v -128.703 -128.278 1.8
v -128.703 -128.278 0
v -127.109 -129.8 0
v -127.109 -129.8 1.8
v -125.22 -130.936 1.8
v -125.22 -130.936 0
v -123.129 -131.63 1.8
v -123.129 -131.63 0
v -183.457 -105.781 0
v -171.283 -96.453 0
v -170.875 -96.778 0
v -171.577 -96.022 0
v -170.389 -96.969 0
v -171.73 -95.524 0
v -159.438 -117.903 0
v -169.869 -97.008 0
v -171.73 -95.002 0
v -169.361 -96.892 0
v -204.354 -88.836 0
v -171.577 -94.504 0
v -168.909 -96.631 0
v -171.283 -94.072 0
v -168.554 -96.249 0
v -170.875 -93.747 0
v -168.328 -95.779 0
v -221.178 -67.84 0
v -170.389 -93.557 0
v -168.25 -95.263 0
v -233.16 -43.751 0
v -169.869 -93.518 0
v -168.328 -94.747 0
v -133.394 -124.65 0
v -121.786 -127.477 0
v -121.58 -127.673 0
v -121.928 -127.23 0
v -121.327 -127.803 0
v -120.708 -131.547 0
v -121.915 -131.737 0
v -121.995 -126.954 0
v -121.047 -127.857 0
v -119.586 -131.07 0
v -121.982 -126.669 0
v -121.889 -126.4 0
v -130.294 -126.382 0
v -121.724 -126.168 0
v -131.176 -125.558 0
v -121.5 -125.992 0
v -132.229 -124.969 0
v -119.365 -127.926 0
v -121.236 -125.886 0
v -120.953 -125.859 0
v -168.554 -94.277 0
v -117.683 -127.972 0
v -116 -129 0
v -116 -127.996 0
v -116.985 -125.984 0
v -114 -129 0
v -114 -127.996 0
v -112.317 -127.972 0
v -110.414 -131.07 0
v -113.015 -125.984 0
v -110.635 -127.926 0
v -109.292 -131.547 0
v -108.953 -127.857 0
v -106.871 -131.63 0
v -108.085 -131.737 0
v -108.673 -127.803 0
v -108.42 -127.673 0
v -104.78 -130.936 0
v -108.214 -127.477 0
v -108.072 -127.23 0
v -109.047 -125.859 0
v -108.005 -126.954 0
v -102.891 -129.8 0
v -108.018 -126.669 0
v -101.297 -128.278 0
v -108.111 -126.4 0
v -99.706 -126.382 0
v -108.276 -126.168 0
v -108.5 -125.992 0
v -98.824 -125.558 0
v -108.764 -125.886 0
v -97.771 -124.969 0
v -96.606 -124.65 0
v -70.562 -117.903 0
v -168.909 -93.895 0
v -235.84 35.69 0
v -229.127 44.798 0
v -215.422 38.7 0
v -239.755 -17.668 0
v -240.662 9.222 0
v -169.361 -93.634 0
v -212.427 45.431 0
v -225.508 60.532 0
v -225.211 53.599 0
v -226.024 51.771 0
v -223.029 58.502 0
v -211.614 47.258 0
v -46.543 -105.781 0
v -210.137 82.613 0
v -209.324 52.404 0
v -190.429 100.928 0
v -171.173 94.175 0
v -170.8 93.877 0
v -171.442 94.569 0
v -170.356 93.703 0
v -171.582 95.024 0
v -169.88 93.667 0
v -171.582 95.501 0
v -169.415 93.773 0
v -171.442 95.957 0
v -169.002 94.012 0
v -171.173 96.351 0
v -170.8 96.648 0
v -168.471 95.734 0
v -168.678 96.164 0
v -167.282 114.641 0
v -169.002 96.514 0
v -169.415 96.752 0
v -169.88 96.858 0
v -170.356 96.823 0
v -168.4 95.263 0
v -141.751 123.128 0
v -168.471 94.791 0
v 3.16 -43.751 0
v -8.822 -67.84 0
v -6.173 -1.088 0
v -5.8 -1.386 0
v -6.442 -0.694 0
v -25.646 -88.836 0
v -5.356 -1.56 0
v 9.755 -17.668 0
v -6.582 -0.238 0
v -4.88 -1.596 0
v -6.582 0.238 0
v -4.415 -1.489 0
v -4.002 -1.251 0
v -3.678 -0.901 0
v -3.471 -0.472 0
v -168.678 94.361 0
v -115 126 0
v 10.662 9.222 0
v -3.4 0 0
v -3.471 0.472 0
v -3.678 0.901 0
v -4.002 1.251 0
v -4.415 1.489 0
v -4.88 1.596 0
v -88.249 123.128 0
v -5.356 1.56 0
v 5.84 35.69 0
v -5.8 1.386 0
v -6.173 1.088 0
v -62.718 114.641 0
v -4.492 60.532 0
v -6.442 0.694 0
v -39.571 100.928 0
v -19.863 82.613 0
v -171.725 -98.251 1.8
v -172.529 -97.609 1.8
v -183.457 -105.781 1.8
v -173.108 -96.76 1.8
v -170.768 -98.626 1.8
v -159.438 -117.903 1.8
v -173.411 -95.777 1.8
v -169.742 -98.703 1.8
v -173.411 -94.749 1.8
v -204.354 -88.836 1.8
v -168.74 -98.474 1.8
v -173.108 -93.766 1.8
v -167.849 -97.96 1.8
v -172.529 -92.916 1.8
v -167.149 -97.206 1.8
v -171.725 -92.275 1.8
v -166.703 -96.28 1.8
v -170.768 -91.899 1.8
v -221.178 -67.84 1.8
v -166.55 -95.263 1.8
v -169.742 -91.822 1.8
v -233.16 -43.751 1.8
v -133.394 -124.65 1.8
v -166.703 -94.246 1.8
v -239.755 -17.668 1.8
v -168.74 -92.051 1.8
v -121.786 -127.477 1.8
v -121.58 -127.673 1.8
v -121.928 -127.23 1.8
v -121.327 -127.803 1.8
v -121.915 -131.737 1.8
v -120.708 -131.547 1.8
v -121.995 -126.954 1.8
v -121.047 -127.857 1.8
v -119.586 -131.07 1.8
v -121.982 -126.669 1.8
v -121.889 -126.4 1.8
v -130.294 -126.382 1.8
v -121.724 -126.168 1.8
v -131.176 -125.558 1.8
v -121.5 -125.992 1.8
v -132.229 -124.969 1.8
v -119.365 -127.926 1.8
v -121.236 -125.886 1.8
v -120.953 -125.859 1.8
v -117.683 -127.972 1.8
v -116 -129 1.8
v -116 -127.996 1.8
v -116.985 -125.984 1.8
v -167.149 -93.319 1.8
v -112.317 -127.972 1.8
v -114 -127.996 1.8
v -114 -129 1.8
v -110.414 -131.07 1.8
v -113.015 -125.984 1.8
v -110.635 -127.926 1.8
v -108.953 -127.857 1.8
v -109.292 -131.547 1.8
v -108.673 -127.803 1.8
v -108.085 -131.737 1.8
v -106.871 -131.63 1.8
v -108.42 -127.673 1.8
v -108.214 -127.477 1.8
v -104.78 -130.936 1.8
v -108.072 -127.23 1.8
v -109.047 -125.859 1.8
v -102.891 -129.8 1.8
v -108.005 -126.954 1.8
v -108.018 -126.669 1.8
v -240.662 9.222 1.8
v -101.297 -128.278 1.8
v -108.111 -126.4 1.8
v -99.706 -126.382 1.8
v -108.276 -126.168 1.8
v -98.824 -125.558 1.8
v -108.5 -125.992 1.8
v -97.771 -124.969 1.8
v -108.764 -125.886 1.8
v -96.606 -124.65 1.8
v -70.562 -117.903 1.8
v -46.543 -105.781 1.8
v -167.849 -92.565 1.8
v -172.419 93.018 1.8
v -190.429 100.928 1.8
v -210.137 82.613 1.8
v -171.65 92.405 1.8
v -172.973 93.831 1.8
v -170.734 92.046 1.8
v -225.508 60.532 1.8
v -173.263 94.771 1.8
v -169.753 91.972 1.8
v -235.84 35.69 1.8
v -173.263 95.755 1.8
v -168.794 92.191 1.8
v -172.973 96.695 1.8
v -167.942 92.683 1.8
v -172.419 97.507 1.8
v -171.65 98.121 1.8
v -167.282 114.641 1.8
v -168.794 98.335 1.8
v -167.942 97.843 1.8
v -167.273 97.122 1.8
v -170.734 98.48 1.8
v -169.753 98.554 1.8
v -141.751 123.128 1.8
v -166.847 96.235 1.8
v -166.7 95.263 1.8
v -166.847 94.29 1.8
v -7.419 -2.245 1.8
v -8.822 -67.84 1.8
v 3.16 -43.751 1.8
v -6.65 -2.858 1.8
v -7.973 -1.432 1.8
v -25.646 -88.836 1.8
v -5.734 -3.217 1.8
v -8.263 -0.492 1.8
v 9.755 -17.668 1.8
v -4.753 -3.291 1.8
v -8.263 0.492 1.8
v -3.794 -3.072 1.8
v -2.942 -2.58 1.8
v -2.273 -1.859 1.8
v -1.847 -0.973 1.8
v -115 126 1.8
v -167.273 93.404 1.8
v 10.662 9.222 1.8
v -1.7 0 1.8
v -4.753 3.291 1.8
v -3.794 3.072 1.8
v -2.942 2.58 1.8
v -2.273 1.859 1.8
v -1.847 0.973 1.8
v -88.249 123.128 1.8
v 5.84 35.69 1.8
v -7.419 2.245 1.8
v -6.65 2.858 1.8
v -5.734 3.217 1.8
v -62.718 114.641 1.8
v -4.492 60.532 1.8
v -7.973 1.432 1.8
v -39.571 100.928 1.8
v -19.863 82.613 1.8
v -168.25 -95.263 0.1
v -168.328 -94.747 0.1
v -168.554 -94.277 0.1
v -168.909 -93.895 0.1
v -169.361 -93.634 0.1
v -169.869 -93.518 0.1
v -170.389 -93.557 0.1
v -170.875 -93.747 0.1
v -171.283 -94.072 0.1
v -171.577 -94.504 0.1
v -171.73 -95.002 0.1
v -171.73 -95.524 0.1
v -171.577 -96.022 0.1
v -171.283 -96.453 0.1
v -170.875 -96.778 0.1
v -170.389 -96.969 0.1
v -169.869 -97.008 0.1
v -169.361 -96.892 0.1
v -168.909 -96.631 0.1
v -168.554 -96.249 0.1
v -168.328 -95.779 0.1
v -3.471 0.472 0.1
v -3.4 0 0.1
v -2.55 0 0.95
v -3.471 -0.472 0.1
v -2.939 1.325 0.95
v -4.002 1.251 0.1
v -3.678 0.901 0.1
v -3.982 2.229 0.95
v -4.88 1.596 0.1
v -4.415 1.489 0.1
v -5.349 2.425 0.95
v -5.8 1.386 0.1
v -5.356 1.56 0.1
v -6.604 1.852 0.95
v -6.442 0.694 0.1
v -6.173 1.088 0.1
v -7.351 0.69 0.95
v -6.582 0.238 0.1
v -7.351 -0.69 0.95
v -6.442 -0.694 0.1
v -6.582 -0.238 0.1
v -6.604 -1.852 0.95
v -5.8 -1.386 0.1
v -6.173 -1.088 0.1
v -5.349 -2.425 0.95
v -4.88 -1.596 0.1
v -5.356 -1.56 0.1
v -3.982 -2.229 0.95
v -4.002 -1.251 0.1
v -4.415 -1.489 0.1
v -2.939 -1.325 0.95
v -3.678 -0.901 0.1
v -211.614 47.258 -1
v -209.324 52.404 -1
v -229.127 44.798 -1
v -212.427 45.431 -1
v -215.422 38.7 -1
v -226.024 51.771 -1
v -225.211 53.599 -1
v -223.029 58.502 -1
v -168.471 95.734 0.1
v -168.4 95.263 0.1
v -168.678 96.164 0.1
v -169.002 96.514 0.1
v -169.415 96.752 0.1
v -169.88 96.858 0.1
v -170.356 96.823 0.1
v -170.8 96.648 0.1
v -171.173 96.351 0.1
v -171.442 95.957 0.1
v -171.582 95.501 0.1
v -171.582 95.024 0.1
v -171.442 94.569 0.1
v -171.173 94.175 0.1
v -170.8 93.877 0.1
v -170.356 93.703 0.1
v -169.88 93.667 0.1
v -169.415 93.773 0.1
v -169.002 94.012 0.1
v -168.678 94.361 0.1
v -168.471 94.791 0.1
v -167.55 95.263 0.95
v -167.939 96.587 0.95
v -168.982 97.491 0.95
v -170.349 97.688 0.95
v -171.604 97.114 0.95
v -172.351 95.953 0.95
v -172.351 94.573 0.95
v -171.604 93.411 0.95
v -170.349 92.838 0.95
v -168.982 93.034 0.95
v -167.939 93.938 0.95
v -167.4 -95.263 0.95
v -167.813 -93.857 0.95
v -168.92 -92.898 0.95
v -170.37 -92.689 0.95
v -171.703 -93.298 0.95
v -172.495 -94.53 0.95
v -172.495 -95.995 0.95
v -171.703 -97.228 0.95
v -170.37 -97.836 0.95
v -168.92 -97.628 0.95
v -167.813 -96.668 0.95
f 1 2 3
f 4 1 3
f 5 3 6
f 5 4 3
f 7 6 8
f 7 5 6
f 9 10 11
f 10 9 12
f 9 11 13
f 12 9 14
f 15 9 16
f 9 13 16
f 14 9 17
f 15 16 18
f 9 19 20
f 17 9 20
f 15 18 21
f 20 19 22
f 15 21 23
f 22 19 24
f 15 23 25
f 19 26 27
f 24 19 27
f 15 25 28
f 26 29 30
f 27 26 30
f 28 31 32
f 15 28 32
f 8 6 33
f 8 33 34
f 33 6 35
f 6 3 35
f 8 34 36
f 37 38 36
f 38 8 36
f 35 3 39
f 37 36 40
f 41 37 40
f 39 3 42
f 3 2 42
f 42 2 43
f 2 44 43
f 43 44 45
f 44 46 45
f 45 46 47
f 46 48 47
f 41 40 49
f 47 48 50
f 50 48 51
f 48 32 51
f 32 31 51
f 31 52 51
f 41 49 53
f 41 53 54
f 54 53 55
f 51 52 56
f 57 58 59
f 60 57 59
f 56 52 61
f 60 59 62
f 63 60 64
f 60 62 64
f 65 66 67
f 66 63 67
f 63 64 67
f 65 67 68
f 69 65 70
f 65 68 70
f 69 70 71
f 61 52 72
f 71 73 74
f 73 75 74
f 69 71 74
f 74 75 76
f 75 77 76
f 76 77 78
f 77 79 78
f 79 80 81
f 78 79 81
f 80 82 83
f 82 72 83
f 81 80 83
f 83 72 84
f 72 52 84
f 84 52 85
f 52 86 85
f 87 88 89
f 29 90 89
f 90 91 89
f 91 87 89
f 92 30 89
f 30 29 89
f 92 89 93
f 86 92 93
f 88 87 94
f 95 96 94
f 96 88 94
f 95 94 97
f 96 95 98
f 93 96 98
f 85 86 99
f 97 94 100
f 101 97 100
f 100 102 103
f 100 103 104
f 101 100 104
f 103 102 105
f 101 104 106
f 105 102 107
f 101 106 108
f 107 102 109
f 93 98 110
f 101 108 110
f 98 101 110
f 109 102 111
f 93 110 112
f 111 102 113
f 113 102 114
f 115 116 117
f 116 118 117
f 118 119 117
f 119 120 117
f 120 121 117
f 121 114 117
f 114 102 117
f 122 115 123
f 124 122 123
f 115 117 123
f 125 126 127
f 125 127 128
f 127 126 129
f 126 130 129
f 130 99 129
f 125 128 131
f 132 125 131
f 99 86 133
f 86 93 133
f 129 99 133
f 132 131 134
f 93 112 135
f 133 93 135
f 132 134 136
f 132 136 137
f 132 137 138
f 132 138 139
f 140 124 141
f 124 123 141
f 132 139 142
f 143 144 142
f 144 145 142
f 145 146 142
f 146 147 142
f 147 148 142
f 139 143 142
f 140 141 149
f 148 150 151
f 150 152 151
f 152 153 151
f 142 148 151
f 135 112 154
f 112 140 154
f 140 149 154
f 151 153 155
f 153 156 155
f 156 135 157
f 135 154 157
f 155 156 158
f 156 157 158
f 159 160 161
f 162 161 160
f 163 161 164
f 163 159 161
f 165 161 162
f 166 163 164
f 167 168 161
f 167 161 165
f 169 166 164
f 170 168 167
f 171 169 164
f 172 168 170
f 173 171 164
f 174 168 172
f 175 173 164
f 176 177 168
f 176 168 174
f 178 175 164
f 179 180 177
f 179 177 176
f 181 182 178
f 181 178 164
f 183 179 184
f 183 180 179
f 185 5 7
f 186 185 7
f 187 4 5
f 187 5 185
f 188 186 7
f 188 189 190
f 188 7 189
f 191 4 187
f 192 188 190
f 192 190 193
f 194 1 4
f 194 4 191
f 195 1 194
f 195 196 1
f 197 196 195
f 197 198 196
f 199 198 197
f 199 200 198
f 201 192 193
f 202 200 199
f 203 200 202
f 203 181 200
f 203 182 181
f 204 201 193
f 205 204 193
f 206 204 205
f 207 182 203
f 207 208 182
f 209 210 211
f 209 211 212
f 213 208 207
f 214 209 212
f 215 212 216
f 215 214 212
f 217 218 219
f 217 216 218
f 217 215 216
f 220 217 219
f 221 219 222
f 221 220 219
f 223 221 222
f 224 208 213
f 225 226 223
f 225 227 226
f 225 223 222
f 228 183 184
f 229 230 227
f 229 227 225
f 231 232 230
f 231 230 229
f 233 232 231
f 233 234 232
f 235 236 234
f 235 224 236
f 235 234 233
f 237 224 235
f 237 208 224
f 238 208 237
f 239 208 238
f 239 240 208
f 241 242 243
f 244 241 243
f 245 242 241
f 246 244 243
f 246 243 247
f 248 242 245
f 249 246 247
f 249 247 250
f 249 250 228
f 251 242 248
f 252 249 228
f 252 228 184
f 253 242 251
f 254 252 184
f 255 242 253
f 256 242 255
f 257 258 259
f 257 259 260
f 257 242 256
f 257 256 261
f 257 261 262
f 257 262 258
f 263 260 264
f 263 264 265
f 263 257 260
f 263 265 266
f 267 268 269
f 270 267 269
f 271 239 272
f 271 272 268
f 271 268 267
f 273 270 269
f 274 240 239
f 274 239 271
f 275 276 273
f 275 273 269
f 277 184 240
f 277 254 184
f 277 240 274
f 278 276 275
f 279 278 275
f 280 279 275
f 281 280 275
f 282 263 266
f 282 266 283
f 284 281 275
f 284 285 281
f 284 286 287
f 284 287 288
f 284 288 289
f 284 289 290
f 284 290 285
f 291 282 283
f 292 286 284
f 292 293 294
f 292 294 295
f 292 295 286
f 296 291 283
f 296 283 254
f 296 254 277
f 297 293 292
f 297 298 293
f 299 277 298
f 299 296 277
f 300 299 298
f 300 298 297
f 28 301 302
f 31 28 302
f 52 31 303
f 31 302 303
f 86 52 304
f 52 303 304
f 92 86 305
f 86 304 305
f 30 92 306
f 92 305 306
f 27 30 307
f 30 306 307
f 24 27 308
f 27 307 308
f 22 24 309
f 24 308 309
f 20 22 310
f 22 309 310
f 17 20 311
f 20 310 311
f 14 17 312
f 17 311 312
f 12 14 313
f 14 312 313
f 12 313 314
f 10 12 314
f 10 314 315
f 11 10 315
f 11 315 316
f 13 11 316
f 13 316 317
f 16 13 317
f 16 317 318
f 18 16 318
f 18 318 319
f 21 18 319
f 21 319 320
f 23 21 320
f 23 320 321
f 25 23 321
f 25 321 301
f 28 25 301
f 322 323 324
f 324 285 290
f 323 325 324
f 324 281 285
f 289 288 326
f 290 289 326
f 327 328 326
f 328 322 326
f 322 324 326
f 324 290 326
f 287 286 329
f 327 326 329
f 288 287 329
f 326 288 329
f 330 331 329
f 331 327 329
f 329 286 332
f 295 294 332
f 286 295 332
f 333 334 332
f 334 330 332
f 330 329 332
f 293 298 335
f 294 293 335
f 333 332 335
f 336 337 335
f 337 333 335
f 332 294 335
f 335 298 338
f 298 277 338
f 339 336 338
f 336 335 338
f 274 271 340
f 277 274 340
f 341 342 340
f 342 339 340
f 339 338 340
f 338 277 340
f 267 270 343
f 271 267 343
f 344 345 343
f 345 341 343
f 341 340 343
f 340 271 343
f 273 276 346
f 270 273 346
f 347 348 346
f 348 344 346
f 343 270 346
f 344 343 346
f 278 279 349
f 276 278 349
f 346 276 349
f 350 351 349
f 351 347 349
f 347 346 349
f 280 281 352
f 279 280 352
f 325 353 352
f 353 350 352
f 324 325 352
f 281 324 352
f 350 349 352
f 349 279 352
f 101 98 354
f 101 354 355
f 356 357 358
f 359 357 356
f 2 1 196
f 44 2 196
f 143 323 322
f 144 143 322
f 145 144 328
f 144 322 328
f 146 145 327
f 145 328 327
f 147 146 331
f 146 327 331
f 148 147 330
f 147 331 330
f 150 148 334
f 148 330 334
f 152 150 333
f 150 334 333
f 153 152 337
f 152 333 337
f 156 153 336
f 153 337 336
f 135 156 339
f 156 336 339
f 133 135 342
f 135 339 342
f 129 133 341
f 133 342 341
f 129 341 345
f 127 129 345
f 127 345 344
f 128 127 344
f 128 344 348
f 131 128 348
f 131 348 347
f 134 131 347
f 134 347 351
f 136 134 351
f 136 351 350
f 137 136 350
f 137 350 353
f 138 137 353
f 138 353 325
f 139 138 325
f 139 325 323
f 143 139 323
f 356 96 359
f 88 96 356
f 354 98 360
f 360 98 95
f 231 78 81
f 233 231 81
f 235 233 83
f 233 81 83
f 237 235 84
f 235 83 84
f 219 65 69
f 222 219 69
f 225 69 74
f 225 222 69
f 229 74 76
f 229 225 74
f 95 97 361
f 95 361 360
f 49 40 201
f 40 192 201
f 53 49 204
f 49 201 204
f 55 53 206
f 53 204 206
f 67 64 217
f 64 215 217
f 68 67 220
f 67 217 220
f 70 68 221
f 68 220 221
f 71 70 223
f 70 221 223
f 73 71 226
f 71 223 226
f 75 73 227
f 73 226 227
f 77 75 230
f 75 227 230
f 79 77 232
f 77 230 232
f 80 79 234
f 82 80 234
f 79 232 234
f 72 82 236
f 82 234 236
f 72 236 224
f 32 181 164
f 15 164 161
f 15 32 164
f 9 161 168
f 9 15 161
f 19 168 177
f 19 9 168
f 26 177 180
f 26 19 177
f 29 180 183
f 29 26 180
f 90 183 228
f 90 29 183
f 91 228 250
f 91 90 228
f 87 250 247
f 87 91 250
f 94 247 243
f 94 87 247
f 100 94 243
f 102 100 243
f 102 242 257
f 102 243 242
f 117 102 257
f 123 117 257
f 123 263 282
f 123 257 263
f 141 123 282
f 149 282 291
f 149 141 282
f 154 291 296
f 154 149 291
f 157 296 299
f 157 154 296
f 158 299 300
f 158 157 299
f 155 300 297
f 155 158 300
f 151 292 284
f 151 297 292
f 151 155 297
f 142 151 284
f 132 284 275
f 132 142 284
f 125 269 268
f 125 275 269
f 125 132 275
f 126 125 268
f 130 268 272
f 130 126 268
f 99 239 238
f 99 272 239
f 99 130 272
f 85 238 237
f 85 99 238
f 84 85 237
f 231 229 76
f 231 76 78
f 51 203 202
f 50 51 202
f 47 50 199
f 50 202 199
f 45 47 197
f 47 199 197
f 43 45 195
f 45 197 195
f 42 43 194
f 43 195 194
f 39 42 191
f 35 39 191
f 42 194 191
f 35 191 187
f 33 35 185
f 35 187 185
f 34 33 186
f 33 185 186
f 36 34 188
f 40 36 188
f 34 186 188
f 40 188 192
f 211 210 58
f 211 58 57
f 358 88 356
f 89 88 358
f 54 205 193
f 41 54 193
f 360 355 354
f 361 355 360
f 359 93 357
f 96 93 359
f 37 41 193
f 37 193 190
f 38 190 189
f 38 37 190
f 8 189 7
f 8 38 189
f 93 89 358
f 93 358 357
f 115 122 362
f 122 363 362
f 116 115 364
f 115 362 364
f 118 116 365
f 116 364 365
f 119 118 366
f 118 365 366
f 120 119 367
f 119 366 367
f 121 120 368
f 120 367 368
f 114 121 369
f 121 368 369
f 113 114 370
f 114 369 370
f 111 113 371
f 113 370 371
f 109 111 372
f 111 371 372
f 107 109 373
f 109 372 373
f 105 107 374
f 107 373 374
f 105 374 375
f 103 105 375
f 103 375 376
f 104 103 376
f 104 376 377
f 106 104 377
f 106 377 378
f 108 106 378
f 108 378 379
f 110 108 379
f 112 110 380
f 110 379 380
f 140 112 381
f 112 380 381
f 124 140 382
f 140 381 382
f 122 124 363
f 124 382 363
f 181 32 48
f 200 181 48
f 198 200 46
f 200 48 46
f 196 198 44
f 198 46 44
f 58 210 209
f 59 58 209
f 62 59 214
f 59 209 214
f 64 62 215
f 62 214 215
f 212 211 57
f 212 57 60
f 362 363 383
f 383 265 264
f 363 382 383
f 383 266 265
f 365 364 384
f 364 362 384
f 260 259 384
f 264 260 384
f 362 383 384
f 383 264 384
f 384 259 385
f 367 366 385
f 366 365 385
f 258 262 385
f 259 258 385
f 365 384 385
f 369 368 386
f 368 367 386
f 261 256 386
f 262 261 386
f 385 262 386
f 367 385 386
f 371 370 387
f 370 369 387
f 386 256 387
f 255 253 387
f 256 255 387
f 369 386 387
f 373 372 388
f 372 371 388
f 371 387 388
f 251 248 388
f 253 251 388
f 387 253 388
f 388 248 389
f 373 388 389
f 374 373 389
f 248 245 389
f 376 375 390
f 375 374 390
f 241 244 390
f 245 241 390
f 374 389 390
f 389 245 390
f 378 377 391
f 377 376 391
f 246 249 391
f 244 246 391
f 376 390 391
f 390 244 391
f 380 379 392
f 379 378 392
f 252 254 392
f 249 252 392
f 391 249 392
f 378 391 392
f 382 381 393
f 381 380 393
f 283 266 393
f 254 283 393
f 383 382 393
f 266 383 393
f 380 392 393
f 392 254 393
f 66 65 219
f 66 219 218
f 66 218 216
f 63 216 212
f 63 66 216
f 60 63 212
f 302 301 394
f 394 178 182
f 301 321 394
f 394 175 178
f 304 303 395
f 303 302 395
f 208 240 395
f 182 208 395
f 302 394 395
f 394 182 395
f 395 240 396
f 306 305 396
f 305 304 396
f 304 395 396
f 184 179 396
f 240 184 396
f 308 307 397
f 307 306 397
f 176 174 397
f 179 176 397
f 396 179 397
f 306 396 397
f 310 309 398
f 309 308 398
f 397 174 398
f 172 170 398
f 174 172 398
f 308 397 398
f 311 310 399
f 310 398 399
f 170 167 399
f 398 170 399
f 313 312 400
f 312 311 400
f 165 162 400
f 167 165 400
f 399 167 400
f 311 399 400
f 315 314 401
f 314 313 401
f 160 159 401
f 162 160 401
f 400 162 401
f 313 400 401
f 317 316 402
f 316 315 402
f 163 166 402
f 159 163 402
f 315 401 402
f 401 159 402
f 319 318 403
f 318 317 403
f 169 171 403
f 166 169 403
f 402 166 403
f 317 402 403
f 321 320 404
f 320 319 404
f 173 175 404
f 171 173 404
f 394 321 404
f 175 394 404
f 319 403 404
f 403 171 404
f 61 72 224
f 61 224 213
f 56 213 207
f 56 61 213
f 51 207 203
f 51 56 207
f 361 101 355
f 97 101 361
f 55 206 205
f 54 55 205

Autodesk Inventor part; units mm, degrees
ref_plane "YZ Plane" through (0, 0, 0) normal (1, 0, 0) x (0, 1, 0)
ref_plane "XZ Plane" through (0, 0, 0) normal (0, 1, 0) x (-1, 0, 0)
ref_plane "XY Plane" through (0, 0, 0) normal (0, 0, 1) x (1, 0, 0)
ref_plane "Work Plane1" through (0, 0, 0) normal (0, 0, 1) x (1, 0, 0)
sketch "Sketch1" plane through (0, 0, 0) normal (0, 0, 1) x (1, 0, 0)
  circle A0 centre (-115, 0) radius 5 projected
  circle A1 centre (-115, 0) radius 126
  point P0 (0, 0)
  dimension "d0" = 252
extrude "Extrusion1" add sketch "Sketch1" along normal blind 1.8 contours A0 | A1
sketch "Sketch2" plane through (-115, 0, 1.8) normal (0, 0, 1) x (1, 0, 0)
  circle A0 centre (-55, 95.2628) radius 1.6
  circle A1 centre (-55, -95.2628) radius 1.75
  circle A2 centre (110, 0) radius 1.6
  circle A3 centre (0, 0) radius 126 projected
  line L0 (-55, 95.2628) -> (110, 0)
  line L1 (110, 0) -> (-55, -95.2628)
  line L2 (-55, -95.2628) -> (-55, 95.2628)
  point P0 (115, 0)
  dimension "d3" = 3.2
  dimension "d4" = 3.5
  dimension "d5" = 3.2
  dimension "d11" = 110
extrude "Extrusion2" cut sketch "Sketch2" against normal blind 10 contours A0 L0 L2 | L2 L0 A0 | L2 L1 A1 | A1 L1 L2 | L0 L1 A2 | A2 L1 L0
chamfer "Chamfer1" distance 1.7 angle 45 3 edges at (-6.6, 0, 1.8) (-171.6, 95.2628, 1.8) (-171.75, -95.2628, 1.8)
sketch "Sketch3" plane through (-115, 0, 1.8) normal (0, 0, 1) x (1, 0, 0)
  circle A0 centre (0, 0) radius 126 projected
  line L0 (-1, -129) -> (-5.9628, -131.8653)
  line L1 (1, -129) -> (5.9628, -131.8653)
  arc A1 (6.0472, -127.8571) -> (5.9528, -125.8593) centre (6, -126.8582) ccw
  arc A2 (-5.9528, -125.8593) -> (-6.0472, -127.8571) centre (-6, -126.8582) ccw
  line L2 (13.7031, -128.2781) -> (16.5283, -124.9112)
  line L3 (-13.7031, -128.2781) -> (-16.5283, -124.9112)
  arc A3 (-6.538, -131.838) -> (-5.9628, -131.8653) centre (0, 0) ccw
  arc A4 (5.9628, -131.8653) -> (6.538, -131.838) centre (0, 0) ccw
  line L4 (1, -127.9961) -> (1, -129)
  line L5 (-1, -127.9961) -> (-1, -129)
  arc A5 (-6.0472, -127.8571) -> (-1, -127.9961) centre (0, 0) ccw
  arc A6 (1, -127.9961) -> (6.0472, -127.8571) centre (0, 0) ccw
  arc A7 (-13.7031, -128.2781) -> (-6.538, -131.838) centre (-6.0427, -121.8503) ccw
  arc A8 (6.538, -131.838) -> (13.7031, -128.2781) centre (6.0427, -121.8503) ccw
  point P0 (115, 0)
  point P1 (10.9628, -131.544)
  point P2 (-10.9628, -131.544)
  dimension "d17" = 129
  dimension "d18" = 129
  dimension "d23" = 5
  dimension "d25" = 5
  dimension "d28" = 10
extrude "Extrusion3" add sketch "Sketch3" against normal up to surface (1.8 mm away) contours A0 A2 A5 L5 L0 A3 A7 L3 | L2 A8 A4 L1 L4 A6 A1 A0
fillet "Fillet1" radius 5 4 edges at (-109.0372, -131.8653, 0.9) (-120.9628, -131.8653, 0.9) (-131.5283, -124.9112, 0.9) (-98.4717, -124.9112, 0.9)
sketch "Sketch4" plane through (0, 0, 0) normal (0, 0, -1) x (-1, 0, 0)
  arc A0 (133.3939, -124.6502) -> (96.6061, -124.6502) centre (115, 0) ccw projected
  arc A1 (116, -127.9961) -> (121.0472, -127.8571) centre (115, 0) ccw projected
  line L0 (115, 0) -> (252.9222, 0) construction
  line L1 (209.3241, 52.4043) -> (223.0286, 58.5024)
  line L2 (229.1267, 44.7979) -> (215.4222, 38.6998)
  line L3 (209.3241, 52.4043) -> (229.1267, 44.7979) construction
  line L4 (223.0286, 58.5024) -> (215.4222, 38.6998) construction
  line L5 (211.6138, 47.2585) -> (225.2106, 53.5988)
  line L6 (223.0286, 58.5024) -> (225.2106, 53.5988)
  line L7 (226.0238, 51.7712) -> (229.1267, 44.7979)
  line L8 (215.4222, 38.6998) -> (212.427, 45.431)
  line L9 (211.6138, 47.2585) -> (209.3241, 52.4043)
  line L10 (115, 0) -> (226.0238, 51.7712)
  point P0 (0, 0)
  point P1 (219.2254, 48.6011)
  dimension "d34" = 15
  dimension "d36" = 115
extrude "Extrusion4" add sketch "Sketch4" along normal blind 1
properties material "Aluminum 6061"
